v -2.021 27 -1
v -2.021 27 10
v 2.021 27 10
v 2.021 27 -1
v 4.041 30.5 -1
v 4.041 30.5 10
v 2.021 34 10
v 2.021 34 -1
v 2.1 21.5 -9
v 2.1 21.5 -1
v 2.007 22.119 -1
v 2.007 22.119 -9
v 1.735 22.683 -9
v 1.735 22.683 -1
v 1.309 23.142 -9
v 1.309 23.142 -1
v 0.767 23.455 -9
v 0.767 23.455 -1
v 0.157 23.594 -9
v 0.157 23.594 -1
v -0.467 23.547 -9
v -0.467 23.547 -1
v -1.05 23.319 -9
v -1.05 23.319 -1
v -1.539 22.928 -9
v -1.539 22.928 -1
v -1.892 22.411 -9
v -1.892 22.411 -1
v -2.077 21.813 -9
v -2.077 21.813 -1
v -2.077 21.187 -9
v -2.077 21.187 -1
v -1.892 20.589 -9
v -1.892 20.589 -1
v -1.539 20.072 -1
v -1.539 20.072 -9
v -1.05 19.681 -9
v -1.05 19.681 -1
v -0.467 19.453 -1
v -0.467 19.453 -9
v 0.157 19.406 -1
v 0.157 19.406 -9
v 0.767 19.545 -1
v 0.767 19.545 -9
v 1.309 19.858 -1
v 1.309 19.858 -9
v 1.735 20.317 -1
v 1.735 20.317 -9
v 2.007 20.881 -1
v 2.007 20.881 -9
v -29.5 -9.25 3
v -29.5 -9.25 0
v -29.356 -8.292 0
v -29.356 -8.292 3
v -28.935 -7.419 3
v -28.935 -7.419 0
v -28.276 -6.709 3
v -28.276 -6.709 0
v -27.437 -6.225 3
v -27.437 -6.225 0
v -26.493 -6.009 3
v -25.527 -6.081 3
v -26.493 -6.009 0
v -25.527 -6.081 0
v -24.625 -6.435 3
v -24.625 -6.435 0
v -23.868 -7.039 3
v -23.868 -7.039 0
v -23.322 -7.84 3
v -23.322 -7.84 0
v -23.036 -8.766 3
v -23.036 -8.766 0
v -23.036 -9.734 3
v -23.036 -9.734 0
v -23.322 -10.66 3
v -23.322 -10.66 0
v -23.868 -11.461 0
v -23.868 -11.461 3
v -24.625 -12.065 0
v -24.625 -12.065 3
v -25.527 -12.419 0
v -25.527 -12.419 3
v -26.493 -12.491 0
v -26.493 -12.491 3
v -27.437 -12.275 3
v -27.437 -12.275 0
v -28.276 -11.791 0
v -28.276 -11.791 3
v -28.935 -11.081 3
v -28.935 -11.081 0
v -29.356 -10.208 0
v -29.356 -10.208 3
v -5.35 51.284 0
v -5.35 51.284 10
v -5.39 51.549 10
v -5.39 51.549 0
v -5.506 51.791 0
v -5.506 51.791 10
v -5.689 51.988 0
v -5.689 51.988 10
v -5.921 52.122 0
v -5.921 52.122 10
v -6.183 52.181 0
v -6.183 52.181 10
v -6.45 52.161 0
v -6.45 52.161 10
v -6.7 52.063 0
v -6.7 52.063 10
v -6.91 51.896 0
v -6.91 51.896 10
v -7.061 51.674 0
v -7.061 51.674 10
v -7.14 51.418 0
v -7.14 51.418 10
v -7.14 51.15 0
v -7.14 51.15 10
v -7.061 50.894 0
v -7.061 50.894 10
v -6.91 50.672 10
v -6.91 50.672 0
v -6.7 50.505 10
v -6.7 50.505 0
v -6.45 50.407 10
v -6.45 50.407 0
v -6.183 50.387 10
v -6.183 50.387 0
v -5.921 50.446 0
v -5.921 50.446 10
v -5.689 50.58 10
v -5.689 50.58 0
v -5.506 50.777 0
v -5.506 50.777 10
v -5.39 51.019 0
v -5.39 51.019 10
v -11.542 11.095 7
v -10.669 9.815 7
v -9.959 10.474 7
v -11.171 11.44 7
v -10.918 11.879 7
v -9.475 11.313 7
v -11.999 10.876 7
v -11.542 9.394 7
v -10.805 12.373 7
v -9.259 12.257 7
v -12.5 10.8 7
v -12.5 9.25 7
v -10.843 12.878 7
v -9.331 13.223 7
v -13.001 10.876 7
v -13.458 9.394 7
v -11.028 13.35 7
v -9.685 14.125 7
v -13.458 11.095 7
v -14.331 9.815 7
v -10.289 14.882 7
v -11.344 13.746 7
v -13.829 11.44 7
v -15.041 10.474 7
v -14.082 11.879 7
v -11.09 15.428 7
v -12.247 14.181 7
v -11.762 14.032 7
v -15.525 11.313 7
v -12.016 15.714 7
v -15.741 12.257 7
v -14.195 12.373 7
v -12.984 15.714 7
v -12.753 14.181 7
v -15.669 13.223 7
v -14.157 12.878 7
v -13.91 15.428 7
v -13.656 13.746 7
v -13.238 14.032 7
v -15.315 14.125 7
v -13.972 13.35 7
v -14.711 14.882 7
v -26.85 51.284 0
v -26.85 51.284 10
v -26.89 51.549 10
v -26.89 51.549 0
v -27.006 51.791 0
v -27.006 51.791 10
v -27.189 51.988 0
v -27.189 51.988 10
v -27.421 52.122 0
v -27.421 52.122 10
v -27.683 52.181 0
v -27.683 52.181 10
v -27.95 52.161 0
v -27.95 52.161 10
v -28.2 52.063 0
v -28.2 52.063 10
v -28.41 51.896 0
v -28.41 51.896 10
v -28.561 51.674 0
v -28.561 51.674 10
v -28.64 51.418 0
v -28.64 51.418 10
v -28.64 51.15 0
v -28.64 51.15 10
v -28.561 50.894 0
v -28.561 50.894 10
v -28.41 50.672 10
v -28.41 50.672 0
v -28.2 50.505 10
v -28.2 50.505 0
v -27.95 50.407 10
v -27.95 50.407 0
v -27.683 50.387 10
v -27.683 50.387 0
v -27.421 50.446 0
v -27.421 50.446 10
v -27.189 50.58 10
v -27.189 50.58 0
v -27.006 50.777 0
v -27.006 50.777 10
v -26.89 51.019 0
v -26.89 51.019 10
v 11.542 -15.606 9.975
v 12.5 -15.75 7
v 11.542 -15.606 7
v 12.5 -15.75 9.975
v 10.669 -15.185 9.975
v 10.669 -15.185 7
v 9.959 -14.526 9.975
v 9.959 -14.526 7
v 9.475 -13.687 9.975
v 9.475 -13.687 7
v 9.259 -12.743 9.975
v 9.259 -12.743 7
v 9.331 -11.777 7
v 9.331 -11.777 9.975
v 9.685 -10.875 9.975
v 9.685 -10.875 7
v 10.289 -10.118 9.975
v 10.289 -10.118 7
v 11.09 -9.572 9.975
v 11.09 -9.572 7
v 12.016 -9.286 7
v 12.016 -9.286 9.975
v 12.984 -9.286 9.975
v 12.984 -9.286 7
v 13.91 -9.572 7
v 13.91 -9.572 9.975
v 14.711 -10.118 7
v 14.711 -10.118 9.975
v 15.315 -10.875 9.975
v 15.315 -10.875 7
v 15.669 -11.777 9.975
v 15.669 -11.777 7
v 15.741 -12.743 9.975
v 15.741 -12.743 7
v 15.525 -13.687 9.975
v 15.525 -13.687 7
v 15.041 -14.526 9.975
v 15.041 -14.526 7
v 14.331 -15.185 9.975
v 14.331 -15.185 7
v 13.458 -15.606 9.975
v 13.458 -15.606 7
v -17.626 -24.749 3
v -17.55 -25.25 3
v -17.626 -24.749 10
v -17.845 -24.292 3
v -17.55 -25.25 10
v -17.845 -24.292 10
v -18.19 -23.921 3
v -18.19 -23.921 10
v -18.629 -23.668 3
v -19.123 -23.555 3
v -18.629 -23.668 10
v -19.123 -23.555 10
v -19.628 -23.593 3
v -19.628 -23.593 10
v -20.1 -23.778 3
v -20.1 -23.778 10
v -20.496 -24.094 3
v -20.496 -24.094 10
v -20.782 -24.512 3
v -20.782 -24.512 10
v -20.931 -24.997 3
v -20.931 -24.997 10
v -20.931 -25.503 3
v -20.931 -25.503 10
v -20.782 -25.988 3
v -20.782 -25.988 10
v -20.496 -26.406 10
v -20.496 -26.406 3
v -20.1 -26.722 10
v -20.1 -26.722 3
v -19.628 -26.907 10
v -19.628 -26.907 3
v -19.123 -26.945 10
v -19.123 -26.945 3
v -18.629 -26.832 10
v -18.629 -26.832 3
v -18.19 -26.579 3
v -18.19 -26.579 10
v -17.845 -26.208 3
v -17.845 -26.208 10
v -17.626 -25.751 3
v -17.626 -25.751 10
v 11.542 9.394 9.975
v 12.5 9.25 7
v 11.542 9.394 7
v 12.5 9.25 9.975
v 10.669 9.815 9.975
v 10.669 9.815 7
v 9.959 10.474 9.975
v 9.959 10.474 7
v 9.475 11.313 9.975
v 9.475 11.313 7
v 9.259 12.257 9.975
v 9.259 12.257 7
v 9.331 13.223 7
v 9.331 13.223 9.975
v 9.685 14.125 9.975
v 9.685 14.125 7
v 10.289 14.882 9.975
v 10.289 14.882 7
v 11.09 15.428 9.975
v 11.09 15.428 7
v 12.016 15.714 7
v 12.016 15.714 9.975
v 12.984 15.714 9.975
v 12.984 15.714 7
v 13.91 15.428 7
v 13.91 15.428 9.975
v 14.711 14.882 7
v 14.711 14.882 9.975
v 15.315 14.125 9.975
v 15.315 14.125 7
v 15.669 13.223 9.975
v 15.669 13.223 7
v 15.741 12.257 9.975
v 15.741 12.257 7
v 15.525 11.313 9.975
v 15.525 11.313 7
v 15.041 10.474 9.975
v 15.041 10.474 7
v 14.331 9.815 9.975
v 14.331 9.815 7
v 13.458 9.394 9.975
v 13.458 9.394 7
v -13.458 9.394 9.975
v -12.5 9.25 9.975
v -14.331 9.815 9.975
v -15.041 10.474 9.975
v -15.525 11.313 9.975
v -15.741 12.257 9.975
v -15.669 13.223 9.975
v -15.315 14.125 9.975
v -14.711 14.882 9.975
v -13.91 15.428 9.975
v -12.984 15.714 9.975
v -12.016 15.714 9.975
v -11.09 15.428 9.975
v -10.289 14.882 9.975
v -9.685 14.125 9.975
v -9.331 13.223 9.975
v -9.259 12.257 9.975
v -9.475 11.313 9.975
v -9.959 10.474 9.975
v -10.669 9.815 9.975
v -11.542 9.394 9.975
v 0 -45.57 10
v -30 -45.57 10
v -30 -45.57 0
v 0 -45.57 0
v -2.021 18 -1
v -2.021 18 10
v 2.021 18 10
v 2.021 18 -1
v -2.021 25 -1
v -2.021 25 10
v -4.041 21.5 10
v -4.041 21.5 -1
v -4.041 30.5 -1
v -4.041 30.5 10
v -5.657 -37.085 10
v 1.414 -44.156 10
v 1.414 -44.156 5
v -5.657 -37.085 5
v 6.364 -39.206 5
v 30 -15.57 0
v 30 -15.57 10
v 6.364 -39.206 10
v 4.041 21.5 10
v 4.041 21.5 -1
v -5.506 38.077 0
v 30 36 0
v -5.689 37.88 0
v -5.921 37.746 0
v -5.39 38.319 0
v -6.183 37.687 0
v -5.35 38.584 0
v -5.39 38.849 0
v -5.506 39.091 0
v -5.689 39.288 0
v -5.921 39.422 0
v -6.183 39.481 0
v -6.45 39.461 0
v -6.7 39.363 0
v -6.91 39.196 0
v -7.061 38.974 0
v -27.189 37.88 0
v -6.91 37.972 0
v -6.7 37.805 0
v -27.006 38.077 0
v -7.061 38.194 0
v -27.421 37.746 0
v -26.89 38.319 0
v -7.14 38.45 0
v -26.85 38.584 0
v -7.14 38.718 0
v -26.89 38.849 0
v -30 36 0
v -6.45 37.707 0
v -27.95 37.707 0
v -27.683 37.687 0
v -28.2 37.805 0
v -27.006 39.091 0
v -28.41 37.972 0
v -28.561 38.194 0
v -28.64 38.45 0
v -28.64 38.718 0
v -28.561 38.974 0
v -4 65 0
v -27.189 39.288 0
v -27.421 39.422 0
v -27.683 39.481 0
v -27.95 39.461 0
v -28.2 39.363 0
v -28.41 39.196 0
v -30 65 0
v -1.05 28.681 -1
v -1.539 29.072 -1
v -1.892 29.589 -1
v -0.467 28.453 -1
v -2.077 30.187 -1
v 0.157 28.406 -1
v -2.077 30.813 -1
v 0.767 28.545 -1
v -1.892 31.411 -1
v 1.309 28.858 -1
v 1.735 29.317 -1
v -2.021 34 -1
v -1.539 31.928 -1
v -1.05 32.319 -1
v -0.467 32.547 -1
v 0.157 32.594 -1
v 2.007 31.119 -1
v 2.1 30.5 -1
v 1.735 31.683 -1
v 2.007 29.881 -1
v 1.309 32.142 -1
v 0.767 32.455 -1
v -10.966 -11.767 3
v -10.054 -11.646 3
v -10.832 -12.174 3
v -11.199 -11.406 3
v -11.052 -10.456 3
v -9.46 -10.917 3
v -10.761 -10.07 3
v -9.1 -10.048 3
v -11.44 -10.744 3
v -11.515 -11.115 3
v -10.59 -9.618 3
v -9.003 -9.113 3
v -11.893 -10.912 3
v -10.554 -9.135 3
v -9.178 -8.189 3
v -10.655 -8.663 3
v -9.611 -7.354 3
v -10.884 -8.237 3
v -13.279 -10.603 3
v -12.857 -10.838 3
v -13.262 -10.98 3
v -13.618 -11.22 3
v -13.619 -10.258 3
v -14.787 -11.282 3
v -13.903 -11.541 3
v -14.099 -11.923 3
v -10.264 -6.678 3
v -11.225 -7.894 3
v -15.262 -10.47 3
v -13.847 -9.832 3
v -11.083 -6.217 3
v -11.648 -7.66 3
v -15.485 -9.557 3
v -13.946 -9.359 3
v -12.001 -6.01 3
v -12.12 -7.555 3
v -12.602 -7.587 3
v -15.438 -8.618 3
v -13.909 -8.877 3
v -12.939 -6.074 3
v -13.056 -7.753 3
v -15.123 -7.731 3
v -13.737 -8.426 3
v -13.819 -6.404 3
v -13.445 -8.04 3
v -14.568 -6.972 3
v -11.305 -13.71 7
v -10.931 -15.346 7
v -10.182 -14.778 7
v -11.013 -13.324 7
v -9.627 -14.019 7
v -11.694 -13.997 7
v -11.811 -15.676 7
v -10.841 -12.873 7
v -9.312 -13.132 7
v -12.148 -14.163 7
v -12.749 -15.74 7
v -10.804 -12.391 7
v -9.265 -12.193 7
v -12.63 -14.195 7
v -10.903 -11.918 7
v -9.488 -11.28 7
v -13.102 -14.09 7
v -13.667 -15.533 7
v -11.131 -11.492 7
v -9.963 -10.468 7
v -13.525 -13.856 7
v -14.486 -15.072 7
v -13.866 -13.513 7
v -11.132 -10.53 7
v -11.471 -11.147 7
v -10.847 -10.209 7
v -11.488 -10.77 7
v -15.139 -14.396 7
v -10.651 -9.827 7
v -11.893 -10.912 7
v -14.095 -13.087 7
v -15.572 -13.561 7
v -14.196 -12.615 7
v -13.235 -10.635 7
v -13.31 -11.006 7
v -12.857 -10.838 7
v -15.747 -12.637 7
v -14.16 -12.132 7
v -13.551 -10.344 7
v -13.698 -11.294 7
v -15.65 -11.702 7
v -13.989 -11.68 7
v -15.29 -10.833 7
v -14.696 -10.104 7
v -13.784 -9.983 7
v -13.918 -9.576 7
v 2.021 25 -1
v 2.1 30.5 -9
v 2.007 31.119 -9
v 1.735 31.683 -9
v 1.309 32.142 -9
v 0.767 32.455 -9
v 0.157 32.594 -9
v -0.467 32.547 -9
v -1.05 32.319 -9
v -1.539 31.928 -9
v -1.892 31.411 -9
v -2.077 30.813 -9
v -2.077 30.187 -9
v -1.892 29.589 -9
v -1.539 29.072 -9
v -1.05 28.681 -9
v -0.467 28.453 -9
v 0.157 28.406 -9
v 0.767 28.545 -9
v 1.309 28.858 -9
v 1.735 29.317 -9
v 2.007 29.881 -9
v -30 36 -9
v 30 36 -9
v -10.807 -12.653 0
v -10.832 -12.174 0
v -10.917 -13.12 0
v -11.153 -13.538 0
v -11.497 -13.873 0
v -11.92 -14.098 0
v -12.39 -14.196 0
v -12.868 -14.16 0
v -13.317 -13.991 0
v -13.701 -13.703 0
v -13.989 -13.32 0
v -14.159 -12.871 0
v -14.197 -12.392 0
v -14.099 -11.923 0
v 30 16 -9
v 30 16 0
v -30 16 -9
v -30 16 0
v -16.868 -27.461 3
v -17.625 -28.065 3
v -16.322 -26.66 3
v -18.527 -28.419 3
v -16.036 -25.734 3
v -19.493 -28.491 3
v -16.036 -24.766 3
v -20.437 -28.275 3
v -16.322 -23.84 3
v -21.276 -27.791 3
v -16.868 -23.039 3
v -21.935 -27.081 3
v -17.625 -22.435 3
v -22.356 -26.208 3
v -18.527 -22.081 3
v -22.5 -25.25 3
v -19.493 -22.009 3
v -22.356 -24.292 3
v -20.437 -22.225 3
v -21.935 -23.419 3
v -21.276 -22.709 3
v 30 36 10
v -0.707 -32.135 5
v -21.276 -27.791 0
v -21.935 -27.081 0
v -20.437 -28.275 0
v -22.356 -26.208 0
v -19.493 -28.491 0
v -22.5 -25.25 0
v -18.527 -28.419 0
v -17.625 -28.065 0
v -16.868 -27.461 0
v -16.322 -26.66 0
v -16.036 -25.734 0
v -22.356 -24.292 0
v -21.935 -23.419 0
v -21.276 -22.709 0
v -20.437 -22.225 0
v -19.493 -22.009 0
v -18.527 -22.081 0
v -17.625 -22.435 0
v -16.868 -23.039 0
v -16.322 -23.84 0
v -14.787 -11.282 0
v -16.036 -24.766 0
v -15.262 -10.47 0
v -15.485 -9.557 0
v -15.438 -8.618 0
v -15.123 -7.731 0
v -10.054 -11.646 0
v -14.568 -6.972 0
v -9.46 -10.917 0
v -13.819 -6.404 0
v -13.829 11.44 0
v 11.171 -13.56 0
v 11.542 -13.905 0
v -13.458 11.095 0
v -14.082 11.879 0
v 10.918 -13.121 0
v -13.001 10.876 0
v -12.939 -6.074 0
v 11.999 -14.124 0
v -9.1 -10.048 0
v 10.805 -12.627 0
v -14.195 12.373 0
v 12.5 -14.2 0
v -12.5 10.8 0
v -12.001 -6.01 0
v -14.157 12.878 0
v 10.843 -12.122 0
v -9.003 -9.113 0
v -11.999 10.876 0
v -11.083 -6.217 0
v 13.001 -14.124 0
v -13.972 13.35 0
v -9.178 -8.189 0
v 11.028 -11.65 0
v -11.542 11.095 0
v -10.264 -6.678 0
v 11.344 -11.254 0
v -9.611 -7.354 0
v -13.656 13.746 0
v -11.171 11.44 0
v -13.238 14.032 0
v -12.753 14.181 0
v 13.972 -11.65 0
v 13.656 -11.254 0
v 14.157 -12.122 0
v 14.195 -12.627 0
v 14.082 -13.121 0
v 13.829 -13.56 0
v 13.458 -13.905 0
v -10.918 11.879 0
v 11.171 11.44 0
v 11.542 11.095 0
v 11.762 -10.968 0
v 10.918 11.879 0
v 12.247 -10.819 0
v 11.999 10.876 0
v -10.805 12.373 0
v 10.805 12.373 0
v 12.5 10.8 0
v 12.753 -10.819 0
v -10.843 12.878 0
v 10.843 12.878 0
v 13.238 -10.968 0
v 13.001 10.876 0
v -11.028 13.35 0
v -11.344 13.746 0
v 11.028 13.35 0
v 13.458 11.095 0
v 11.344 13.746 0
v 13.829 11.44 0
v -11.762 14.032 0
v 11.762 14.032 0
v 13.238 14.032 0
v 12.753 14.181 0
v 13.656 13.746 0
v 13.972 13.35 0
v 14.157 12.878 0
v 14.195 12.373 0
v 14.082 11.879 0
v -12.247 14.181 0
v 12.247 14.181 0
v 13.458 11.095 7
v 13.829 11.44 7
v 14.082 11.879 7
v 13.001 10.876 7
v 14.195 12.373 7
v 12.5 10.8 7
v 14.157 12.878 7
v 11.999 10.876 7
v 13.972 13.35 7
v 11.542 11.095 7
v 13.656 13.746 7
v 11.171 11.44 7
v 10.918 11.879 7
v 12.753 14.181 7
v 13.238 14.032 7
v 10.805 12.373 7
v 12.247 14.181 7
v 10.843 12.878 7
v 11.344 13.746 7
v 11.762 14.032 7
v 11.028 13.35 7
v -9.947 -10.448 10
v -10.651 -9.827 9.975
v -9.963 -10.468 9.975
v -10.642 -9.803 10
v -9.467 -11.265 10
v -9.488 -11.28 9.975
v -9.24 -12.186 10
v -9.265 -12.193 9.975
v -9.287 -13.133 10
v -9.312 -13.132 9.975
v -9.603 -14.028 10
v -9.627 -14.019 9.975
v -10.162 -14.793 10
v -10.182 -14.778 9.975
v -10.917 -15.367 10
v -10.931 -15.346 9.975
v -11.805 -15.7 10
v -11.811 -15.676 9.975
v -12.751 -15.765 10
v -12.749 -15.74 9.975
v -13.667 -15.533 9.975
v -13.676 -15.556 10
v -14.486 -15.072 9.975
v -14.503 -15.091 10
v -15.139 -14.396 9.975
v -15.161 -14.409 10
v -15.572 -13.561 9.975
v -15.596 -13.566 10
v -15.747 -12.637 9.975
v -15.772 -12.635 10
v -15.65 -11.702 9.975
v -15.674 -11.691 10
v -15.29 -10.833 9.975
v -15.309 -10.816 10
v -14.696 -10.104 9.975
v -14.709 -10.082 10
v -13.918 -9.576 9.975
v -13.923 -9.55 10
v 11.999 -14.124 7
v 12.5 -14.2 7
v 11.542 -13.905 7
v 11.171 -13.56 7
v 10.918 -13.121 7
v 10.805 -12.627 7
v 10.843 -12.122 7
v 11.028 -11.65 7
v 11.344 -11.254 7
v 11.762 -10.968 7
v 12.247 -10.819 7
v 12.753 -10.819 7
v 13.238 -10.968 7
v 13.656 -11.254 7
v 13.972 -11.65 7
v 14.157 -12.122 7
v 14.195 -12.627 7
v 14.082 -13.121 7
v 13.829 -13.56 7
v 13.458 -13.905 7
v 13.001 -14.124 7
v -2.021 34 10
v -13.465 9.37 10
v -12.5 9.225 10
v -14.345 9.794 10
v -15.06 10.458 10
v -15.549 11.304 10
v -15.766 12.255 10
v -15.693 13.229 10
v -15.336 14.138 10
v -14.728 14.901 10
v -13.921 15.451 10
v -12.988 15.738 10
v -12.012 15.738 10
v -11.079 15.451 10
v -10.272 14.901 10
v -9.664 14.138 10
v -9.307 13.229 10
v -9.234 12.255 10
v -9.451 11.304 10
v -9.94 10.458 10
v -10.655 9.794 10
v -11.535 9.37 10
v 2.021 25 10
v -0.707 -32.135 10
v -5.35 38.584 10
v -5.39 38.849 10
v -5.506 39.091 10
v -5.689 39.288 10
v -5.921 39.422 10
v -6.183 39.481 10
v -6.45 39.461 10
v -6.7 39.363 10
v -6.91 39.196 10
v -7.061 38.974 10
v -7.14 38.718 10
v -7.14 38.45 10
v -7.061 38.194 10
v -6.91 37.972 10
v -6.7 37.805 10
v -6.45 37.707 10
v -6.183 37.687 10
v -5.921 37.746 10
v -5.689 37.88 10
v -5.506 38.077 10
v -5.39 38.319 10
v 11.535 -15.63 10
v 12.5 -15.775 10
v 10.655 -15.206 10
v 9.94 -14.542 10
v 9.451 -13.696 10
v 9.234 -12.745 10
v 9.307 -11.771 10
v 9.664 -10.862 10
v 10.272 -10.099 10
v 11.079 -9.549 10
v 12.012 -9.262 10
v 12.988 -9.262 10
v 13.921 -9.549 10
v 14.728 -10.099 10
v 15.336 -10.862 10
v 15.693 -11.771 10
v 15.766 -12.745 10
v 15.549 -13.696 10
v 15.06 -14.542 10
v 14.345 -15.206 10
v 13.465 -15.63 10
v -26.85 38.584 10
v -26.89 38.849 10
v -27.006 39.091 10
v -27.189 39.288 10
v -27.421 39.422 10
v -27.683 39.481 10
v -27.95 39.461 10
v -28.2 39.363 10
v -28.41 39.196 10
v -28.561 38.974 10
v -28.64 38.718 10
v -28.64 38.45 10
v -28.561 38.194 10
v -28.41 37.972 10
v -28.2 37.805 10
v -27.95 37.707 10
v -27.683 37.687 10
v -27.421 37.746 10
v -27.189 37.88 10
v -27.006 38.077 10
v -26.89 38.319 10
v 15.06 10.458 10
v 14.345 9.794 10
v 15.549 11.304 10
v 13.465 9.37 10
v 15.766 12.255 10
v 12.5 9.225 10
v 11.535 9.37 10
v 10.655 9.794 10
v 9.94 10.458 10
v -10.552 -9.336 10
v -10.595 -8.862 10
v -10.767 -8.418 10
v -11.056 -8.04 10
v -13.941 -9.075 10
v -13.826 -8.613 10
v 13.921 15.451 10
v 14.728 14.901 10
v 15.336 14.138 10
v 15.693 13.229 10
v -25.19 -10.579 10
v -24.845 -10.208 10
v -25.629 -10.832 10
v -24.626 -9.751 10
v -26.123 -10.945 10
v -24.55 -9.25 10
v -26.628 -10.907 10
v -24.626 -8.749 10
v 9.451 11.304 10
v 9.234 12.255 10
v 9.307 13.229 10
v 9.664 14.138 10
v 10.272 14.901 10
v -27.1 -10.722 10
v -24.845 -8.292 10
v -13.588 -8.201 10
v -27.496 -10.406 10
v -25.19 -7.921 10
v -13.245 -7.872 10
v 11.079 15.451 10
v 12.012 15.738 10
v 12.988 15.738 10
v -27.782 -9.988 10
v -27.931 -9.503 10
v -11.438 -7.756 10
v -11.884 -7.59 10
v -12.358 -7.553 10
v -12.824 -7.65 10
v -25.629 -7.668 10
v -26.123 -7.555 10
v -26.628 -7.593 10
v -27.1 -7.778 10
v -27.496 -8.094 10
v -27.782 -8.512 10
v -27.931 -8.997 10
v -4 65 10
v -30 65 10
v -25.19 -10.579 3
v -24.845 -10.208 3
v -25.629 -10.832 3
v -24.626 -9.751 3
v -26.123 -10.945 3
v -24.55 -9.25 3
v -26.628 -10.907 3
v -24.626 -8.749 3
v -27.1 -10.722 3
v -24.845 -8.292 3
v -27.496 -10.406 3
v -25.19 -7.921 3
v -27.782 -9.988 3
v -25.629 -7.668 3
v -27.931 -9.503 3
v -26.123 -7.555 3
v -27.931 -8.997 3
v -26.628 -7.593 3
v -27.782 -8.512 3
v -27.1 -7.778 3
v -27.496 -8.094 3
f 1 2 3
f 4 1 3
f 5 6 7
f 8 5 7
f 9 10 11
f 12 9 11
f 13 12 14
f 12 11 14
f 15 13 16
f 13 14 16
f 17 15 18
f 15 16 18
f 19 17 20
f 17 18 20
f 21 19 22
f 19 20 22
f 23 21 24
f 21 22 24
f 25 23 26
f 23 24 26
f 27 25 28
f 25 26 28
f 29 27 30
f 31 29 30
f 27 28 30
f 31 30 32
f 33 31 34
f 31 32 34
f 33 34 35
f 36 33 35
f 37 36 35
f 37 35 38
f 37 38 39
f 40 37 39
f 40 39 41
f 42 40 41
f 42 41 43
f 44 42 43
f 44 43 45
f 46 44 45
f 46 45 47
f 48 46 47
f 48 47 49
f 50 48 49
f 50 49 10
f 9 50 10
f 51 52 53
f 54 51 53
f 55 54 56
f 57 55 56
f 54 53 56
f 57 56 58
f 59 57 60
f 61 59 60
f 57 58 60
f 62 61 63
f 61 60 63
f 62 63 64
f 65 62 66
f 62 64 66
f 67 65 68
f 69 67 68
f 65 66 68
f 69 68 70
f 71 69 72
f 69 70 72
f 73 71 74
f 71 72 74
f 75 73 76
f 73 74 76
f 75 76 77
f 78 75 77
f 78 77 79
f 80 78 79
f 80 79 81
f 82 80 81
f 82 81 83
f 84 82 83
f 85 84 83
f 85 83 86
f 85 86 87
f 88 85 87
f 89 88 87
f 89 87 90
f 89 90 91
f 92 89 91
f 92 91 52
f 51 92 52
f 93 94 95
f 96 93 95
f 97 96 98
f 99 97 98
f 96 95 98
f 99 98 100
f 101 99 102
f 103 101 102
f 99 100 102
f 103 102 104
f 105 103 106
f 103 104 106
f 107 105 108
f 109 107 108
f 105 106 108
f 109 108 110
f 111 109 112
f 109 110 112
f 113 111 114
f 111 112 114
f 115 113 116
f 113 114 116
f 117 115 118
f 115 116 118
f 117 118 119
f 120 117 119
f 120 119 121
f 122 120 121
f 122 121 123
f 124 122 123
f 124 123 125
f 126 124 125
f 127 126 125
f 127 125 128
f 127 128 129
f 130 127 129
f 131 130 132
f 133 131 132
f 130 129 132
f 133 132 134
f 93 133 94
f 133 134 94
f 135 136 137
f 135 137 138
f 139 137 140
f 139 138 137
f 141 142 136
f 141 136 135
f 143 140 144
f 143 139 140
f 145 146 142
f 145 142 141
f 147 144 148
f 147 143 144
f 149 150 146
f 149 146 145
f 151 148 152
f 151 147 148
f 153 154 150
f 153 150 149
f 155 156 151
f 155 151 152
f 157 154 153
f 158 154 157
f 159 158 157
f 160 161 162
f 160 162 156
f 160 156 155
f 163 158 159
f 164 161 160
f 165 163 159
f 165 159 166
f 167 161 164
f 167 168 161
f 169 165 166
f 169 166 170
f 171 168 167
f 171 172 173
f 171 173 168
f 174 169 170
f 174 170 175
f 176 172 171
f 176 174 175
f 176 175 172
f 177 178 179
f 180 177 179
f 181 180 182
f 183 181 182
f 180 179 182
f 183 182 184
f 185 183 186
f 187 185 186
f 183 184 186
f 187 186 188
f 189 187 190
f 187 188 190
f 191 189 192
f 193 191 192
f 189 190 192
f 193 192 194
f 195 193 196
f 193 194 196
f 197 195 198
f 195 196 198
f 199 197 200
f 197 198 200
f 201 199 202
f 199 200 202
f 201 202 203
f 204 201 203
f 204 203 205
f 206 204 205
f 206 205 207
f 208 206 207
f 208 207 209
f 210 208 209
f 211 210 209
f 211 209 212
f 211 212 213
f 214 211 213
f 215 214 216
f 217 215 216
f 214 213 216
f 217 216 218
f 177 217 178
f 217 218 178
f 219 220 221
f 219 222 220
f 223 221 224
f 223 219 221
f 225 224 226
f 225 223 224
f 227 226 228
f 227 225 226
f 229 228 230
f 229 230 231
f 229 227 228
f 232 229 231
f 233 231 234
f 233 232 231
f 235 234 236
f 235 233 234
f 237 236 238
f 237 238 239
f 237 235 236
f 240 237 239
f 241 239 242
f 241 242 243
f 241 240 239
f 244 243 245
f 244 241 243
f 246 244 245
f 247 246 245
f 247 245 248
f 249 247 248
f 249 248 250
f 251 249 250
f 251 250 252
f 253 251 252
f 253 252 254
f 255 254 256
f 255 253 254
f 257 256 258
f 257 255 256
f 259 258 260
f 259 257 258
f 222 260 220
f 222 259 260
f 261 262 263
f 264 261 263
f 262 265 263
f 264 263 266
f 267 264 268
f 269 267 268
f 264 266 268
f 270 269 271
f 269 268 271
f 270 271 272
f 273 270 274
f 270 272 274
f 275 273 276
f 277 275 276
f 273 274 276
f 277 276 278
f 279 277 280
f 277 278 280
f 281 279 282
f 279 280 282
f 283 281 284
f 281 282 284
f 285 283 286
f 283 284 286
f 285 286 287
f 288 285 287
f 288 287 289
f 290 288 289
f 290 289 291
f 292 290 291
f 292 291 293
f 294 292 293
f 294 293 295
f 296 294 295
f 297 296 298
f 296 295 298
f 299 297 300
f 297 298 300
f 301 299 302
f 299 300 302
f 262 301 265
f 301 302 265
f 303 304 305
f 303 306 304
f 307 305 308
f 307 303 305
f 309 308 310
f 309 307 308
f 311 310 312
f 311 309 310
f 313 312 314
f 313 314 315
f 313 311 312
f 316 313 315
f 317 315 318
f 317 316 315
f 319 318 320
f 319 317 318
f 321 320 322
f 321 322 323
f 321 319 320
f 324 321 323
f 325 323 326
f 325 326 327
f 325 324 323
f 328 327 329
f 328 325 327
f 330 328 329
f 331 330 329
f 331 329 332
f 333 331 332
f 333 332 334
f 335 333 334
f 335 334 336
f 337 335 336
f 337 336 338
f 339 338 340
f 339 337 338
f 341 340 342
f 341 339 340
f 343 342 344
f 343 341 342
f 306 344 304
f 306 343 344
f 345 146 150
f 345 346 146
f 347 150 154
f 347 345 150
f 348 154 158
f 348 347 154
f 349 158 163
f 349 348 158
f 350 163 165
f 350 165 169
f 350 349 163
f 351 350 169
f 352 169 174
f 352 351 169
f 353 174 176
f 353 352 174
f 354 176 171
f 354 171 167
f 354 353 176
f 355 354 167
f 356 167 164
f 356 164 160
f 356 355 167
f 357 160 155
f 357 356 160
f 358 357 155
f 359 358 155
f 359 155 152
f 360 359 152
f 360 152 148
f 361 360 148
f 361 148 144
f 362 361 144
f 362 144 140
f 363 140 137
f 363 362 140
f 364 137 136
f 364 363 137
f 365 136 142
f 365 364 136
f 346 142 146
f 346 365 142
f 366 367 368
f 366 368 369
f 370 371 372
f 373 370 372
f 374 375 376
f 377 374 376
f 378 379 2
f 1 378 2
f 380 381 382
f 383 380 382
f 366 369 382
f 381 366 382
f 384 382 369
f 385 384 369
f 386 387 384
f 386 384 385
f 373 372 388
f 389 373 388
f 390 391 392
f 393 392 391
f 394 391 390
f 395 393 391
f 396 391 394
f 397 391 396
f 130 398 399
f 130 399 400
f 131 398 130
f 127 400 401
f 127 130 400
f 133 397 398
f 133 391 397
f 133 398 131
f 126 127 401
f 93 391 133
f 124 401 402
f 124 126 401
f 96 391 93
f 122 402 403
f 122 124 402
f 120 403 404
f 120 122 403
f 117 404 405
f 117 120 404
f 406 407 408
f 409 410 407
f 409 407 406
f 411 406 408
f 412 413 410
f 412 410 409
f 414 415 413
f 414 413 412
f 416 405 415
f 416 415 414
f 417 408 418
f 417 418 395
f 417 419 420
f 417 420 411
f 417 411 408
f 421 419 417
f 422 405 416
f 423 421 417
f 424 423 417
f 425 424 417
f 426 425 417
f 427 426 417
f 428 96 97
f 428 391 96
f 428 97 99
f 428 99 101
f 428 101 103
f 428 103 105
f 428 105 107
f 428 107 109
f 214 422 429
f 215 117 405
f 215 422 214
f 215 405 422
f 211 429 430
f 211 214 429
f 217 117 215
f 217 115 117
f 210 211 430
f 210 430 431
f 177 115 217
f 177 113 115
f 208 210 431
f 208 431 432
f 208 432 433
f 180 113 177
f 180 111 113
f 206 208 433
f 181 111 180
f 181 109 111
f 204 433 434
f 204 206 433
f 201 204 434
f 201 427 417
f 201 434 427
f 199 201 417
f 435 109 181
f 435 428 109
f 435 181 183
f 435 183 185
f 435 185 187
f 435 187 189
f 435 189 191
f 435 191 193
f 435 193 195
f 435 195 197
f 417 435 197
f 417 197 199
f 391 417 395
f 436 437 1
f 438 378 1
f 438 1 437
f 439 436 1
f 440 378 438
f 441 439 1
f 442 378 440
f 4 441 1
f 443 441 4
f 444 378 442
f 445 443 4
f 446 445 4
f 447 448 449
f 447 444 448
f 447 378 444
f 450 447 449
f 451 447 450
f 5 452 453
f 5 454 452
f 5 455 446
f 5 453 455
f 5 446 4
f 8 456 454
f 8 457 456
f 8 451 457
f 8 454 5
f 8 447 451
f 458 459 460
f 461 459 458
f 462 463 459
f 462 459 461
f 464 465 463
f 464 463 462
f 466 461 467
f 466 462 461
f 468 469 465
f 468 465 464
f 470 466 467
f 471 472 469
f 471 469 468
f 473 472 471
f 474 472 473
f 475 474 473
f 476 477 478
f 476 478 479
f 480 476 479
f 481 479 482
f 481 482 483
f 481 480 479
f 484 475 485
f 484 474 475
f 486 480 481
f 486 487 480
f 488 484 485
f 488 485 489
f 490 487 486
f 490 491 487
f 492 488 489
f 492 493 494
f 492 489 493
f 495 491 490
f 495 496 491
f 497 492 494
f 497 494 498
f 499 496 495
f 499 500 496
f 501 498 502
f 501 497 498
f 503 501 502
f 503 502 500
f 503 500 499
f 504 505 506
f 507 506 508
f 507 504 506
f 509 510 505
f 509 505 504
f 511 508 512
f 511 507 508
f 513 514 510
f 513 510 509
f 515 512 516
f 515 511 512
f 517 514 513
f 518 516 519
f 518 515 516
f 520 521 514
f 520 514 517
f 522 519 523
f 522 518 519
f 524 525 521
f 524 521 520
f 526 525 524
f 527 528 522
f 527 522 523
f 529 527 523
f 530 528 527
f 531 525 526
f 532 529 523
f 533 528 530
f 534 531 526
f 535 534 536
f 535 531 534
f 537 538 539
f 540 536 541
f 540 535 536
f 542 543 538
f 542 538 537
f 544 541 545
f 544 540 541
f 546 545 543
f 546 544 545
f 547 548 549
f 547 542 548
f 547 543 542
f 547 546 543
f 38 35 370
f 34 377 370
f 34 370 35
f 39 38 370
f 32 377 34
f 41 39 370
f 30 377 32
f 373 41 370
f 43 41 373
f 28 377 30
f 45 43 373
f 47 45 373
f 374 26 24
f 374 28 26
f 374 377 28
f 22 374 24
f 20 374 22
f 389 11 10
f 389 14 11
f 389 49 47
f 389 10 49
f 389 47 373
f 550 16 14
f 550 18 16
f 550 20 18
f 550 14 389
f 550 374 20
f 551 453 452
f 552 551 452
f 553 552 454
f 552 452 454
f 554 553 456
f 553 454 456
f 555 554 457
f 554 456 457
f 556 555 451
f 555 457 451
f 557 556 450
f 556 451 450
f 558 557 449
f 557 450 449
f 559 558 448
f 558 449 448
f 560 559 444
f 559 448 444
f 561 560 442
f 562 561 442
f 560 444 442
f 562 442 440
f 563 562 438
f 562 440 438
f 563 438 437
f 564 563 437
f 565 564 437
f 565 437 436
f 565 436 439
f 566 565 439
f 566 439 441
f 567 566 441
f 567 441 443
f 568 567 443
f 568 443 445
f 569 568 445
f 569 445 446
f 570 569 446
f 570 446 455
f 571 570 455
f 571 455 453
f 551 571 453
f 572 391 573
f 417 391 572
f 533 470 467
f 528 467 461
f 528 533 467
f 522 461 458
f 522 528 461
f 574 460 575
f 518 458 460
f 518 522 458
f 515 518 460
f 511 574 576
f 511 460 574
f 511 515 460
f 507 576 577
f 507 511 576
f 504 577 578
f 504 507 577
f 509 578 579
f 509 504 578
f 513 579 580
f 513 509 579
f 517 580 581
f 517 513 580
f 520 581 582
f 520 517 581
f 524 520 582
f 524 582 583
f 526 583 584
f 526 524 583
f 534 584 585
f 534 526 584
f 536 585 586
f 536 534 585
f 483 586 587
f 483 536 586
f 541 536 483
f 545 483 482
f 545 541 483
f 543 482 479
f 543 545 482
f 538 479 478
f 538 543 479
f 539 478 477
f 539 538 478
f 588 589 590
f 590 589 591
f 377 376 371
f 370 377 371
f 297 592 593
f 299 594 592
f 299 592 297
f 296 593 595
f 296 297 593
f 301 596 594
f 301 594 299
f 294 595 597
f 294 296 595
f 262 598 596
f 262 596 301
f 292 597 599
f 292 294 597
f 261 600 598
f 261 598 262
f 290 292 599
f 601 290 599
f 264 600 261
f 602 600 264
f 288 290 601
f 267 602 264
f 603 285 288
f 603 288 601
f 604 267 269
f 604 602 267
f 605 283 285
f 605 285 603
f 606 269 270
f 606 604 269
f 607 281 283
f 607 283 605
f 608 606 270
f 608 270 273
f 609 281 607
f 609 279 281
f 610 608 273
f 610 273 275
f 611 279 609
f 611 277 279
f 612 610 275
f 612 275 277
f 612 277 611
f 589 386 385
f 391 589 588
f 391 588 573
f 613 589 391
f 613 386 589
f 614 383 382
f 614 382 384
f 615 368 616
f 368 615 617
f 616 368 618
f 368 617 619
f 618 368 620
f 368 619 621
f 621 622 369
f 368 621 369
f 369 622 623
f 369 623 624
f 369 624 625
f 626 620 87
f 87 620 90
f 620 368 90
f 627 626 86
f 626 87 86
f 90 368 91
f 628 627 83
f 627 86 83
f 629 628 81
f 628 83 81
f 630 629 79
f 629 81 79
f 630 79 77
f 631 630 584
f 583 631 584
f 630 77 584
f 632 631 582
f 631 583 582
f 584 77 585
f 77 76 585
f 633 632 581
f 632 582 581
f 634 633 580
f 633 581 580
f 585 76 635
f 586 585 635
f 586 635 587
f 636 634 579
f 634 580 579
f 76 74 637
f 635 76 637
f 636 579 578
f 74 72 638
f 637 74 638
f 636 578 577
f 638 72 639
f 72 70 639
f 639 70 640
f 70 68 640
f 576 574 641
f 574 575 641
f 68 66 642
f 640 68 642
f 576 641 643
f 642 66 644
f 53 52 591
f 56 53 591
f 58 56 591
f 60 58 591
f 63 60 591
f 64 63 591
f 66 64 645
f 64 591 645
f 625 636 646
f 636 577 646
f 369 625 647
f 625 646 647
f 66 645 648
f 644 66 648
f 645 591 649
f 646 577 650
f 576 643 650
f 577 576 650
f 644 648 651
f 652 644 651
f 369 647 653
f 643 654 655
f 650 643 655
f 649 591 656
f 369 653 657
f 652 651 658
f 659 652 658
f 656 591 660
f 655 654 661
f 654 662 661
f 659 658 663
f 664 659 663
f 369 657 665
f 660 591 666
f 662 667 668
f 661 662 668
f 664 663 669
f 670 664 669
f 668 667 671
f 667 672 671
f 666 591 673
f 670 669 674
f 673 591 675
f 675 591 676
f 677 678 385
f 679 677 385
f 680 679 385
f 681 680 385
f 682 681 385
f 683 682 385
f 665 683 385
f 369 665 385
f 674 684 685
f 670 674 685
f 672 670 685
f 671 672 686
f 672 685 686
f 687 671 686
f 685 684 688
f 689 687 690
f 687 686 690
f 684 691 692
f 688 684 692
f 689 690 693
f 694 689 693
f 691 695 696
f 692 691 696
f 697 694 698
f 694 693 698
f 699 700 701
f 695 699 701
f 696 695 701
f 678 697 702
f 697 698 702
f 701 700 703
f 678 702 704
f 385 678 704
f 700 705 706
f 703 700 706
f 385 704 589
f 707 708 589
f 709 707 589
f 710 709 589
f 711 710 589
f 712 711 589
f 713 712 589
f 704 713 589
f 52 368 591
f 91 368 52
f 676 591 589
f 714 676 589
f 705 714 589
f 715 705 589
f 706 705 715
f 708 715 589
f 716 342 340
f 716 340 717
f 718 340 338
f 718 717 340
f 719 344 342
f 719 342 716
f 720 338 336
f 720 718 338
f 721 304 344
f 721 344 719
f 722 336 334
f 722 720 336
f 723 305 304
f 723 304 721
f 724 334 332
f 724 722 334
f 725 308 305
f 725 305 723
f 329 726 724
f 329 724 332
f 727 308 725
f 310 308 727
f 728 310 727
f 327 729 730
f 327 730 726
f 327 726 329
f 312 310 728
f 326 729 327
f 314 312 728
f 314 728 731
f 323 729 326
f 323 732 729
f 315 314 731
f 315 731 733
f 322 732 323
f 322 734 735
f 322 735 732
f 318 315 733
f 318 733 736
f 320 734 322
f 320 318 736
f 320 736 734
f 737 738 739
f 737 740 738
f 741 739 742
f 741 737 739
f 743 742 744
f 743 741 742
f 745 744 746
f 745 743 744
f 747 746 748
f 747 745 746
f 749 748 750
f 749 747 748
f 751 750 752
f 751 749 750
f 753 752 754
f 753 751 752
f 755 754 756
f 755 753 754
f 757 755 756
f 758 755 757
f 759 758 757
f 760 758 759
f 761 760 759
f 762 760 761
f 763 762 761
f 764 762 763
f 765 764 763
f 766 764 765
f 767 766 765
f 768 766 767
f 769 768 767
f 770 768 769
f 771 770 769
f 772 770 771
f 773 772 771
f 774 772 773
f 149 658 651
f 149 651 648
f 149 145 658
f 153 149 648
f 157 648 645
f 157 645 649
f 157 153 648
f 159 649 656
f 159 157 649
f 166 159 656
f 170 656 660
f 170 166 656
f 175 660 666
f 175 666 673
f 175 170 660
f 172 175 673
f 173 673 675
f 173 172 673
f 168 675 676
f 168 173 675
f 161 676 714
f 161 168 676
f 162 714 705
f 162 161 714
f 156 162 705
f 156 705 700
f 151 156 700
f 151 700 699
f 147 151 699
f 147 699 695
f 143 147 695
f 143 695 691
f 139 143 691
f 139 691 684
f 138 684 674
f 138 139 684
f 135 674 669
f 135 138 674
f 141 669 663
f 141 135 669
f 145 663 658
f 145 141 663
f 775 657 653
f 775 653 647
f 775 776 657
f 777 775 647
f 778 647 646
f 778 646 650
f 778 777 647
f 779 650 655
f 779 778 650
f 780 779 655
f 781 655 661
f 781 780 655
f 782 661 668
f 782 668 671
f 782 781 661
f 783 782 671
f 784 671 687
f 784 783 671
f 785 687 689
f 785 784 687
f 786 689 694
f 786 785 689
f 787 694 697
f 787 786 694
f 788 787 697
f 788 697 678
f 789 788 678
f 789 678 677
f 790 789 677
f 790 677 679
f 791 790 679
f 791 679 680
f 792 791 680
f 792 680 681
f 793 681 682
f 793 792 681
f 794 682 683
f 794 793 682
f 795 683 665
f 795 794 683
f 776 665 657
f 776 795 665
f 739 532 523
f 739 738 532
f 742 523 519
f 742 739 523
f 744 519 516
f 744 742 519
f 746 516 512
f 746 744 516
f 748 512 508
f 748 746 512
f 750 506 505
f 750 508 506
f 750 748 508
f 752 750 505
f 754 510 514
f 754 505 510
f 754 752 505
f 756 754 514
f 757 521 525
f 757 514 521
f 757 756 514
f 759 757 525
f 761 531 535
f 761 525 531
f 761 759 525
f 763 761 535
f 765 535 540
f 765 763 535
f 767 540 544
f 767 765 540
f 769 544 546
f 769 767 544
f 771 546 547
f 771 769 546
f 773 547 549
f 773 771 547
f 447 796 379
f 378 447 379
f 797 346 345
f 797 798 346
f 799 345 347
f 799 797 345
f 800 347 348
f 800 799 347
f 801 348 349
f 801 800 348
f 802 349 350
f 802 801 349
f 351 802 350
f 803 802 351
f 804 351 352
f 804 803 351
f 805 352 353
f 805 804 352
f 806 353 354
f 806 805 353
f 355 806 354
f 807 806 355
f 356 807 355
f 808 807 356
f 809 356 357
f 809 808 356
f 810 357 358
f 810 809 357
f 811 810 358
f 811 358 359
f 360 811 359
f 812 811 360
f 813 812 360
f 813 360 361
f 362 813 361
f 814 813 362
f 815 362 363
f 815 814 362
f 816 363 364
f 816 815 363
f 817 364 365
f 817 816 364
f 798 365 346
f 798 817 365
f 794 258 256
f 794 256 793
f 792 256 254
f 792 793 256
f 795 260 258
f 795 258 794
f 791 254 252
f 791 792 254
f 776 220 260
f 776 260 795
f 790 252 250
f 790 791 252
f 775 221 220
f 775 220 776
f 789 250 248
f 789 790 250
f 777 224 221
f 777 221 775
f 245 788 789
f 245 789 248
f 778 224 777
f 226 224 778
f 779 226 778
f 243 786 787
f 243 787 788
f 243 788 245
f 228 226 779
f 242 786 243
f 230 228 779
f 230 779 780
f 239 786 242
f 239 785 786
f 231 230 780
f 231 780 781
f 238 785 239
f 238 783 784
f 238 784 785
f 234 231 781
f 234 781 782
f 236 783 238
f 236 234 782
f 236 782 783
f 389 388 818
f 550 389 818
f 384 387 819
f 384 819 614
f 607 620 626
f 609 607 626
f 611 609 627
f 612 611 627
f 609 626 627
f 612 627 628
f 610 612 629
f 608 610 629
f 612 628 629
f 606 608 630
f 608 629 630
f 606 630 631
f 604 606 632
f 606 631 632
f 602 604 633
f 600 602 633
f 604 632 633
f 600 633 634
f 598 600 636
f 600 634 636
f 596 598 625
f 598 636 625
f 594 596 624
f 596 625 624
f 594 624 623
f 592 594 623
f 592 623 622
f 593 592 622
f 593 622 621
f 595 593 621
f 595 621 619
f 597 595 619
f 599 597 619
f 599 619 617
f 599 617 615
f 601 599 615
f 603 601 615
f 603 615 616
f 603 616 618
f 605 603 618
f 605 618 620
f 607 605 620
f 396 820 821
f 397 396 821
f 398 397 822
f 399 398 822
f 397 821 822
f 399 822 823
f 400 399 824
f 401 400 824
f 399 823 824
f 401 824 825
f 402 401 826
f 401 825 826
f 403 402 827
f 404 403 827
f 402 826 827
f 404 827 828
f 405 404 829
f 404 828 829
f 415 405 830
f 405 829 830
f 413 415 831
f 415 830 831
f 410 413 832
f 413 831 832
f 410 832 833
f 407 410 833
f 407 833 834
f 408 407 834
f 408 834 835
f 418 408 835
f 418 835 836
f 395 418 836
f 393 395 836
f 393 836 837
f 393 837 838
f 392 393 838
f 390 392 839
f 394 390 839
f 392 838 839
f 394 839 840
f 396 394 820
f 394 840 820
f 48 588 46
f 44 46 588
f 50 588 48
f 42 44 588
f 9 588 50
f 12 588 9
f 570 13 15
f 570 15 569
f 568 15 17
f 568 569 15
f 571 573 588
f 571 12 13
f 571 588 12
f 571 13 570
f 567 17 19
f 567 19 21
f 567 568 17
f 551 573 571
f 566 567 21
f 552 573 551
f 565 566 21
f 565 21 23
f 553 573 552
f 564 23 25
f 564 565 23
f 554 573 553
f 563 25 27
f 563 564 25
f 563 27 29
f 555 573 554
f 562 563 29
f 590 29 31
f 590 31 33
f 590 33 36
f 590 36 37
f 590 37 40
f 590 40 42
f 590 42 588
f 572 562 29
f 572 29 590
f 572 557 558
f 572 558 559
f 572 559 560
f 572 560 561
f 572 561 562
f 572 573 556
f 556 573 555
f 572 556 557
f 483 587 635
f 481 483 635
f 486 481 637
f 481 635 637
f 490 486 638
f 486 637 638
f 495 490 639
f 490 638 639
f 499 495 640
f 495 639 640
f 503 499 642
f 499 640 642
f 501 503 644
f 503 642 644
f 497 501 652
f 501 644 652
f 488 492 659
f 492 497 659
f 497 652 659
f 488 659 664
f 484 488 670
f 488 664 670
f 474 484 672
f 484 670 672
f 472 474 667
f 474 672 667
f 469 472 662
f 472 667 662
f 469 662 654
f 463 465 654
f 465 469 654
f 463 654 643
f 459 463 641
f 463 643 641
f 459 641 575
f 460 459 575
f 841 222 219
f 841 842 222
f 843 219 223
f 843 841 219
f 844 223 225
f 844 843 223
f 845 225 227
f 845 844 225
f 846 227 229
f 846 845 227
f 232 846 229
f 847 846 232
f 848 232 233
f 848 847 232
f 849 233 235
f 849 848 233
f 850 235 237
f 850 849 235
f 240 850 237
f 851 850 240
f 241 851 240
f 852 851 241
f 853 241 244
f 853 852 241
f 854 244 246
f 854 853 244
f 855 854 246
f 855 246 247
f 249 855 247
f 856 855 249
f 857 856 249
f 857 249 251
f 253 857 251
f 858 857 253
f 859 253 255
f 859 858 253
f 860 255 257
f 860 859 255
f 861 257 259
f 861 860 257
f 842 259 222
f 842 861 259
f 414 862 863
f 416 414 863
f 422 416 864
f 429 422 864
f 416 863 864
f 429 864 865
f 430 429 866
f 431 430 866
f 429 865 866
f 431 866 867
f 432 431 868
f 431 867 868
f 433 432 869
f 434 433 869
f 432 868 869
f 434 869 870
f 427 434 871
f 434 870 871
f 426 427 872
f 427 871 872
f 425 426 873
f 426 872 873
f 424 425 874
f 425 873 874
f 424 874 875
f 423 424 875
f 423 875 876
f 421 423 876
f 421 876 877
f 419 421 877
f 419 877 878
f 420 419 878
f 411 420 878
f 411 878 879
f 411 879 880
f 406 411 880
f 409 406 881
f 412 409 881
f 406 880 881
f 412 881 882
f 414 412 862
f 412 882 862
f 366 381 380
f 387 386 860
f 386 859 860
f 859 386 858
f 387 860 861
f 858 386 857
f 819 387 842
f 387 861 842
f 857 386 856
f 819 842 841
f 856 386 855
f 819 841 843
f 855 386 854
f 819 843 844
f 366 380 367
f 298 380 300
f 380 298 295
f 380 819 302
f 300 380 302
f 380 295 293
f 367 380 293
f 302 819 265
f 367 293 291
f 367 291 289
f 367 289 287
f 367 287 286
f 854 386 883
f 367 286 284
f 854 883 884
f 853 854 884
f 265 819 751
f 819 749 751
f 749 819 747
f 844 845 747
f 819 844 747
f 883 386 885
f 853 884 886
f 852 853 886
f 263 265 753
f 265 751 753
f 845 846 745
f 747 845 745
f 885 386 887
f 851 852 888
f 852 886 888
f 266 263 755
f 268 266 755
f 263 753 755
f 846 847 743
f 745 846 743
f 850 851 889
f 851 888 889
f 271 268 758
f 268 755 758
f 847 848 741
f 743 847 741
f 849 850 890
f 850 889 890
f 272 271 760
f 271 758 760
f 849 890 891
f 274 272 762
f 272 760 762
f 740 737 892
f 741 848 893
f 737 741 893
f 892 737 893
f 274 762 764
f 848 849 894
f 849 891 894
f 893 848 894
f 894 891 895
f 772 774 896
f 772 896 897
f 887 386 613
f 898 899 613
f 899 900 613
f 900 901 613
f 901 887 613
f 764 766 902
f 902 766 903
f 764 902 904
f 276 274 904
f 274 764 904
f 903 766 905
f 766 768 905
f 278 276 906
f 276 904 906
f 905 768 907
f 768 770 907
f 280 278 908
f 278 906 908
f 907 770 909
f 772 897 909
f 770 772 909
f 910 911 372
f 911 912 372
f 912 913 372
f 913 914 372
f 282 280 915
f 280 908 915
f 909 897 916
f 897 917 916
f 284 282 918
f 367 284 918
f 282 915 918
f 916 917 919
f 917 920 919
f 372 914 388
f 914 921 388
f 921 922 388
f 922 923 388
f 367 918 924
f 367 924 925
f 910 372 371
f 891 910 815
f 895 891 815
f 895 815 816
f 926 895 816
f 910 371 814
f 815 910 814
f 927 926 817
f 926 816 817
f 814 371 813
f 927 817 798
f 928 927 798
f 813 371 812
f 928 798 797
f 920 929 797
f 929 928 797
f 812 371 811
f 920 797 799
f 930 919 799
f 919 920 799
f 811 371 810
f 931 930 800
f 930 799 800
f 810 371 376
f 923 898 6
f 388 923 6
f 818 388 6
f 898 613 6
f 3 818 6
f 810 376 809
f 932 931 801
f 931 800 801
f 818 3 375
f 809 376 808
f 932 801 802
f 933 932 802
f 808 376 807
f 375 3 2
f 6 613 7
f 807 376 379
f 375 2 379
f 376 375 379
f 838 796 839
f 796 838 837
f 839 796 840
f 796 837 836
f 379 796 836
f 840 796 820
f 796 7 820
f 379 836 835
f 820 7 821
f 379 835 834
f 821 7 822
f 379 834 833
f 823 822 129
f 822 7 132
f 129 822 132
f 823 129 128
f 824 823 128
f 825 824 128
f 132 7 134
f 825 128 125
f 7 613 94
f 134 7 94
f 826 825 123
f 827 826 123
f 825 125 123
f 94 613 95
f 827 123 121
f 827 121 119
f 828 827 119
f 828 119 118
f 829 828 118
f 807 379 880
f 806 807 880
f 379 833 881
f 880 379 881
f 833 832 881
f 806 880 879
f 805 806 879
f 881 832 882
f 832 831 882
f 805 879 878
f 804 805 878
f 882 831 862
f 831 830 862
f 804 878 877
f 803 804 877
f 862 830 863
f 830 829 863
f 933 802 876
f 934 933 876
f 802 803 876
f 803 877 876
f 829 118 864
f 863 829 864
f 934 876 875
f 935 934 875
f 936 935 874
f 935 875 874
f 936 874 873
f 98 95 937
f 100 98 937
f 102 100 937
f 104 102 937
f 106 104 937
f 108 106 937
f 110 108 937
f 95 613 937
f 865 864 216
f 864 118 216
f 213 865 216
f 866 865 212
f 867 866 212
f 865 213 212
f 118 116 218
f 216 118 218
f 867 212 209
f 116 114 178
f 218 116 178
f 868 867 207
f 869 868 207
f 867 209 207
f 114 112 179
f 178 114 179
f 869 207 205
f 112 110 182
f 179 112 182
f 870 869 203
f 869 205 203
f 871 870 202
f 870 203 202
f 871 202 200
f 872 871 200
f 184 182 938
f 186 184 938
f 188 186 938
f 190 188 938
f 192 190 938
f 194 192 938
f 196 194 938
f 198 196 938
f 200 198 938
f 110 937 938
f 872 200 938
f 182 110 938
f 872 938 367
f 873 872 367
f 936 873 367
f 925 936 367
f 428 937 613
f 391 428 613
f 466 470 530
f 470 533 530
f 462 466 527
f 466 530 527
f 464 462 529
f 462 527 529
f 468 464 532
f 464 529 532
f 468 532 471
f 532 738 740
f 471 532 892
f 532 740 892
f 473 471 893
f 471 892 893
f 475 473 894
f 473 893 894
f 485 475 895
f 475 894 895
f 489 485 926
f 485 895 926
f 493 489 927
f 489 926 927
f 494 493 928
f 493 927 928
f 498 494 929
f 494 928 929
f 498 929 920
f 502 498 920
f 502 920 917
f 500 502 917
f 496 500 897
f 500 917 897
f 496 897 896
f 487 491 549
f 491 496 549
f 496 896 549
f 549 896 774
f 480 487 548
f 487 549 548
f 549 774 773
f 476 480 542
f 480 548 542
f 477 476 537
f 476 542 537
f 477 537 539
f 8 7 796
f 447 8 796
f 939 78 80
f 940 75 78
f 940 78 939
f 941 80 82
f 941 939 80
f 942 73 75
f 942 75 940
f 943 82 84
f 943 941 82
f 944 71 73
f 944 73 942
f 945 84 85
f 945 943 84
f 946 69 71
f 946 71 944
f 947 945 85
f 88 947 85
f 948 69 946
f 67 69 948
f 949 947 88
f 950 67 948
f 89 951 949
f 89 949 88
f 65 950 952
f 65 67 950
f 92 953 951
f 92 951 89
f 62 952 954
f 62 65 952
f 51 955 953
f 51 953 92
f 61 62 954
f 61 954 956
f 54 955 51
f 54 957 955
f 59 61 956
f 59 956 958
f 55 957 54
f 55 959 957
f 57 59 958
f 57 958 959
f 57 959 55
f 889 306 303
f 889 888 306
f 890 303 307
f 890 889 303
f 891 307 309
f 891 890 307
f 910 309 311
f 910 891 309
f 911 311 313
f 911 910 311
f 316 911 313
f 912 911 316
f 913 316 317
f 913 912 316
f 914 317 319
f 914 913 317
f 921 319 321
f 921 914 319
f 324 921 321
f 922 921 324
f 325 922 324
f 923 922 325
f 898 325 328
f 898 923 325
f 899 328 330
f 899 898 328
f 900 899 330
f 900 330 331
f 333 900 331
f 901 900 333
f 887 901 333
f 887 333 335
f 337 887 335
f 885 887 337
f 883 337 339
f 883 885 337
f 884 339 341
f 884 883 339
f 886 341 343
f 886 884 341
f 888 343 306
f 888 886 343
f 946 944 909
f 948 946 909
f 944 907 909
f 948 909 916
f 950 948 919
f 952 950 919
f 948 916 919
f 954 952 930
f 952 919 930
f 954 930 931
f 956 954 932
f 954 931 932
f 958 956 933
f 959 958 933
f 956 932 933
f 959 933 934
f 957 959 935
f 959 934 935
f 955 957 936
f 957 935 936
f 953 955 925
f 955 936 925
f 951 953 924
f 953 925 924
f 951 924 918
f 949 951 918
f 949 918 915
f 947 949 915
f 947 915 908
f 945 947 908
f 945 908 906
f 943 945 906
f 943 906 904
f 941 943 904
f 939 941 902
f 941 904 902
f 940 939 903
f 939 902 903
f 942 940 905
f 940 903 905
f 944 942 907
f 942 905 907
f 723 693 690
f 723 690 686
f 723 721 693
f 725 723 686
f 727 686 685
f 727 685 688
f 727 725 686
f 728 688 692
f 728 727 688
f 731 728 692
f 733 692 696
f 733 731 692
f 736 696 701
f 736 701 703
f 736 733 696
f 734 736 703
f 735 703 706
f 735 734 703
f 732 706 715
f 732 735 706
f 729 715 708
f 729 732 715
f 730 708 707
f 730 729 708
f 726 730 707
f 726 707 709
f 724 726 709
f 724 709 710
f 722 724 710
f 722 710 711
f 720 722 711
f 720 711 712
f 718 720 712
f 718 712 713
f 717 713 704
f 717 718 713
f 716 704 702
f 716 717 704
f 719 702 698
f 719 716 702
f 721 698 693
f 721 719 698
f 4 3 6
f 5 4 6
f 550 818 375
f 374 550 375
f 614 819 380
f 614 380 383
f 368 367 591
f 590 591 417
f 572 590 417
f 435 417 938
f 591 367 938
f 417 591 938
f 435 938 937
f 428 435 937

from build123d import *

# Parameters (mm, degrees)
SKETCH2_W                      = 60
SKETCH2_H                      = 72
BOSS_EXTRUDE1_DEPTH            = 10
SKETCH9_W                      = 60
SKETCH9_H                      = 20
BOSS_EXTRUDE2_DEPTH            = 9
CBORE_FOR_M3_SHCS1_AT_2_COUNT  = 2
CBORE_FOR_M3_SHCS1_AT_2_PITCH  = 25
CBORE_FOR_M3_SHCS1_AT_3_COUNT  = 2
CBORE_FOR_M3_SHCS1_AT_3_PITCH  = 35.355339059
CBORE_FOR_M3_SHCS1_AT_4_COUNT  = 2
CBORE_FOR_M3_SHCS1_AT_4_PITCH  = 25
CUT_EXTRUDE1_DEPTH             = 11
SKETCH8_R                      = 2.1
CUT_EXTRUDE2_DEPTH             = 49.135226186
SKETCH14_W                     = 60
SKETCH14_H                     = 9.57
BOSS_EXTRUDE3_DEPTH            = 10
CBORE_FOR_M3_SHCS2_D           = 3.4
CBORE_FOR_M3_SHCS2_CBORE_D     = 6.5
CBORE_FOR_M3_SHCS2_CBORE_DEPTH = 3
CUT_EXTRUDE3_DEPTH             = 58.772181022
BOSS_EXTRUDE4_DEPTH            = 10
SKETCH20_R                     = 0.9
CUT_EXTRUDE4_DEPTH             = 10
SKETCH21_W                     = 5
SKETCH21_H                     = 7
CUT_EXTRUDE5_DEPTH             = 10


with BuildPart() as part:
    # Sketch2 → Boss-Extrude1 (new body)
    with BuildSketch(Plane.XY):
        Rectangle(SKETCH2_W, SKETCH2_H)
    extrude(amount=BOSS_EXTRUDE1_DEPTH)

    # Sketch9 → Boss-Extrude2 (add)
    with BuildSketch(Plane(origin=(0, 0, 0), x_dir=(-1, 0, 0), z_dir=(0, 0, -1))):
        with Locations((0, 26)):
            Rectangle(SKETCH9_W, SKETCH9_H)
    extrude(amount=BOSS_EXTRUDE2_DEPTH)

    # Sketch6 → CBORE for M3 SHCS1 (revolve, cut)
    with BuildSketch(Plane(origin=(-12.5, 12.5, 10), x_dir=(0, -1, 0), z_dir=(1, 0, 0))):
        Polygon((0, 0), (0, 11.021463052), (1.7, 10), (1.7, 3), (3.25, 3), (3.25, 0.025), (3.275, 0), align=None)
    cbore_for_m3_shcs1 = revolve(axis=Axis((-12.5, 12.5, 16.35), (0, 0, -1)), mode=Mode.SUBTRACT)

    # CBORE for M3 SHCS1 at 2: CBORE for M3 SHCS1 ×2
    with Locations(*[(i * CBORE_FOR_M3_SHCS1_AT_2_PITCH, 0, 0) for i in range(1, CBORE_FOR_M3_SHCS1_AT_2_COUNT)]):
        add(cbore_for_m3_shcs1, mode=Mode.SUBTRACT)

    # CBORE for M3 SHCS1 at 3: CBORE for M3 SHCS1 ×2
    with Locations(*[Vector(0.7071067811865477, -0.7071067811865475, 0) * (i * CBORE_FOR_M3_SHCS1_AT_3_PITCH) for i in range(1, CBORE_FOR_M3_SHCS1_AT_3_COUNT)]):
        add(cbore_for_m3_shcs1, mode=Mode.SUBTRACT)

    # CBORE for M3 SHCS1 at 4: CBORE for M3 SHCS1 ×2
    with Locations(*[(0, -i * CBORE_FOR_M3_SHCS1_AT_4_PITCH, 0) for i in range(1, CBORE_FOR_M3_SHCS1_AT_4_COUNT)]):
        add(cbore_for_m3_shcs1, mode=Mode.SUBTRACT)

    # Sketch7 → Cut-Extrude1 (cut)
    with BuildSketch(Plane.XY.offset(10)):
        Polygon((4.041451884, 21.5), (2.020725942, 25), (-2.020725942, 25), (-4.041451884, 21.5), (-2.020725942, 18), (2.020725942, 18), align=None)
        Polygon((4.041451884, 30.5), (2.020725942, 34), (-2.020725942, 34), (-4.041451884, 30.5), (-2.020725942, 27), (2.020725942, 27), align=None)
    extrude(amount=-CUT_EXTRUDE1_DEPTH, mode=Mode.SUBTRACT)

    # Sketch8 → Cut-Extrude2 (cut, through all)
    with BuildSketch(Plane.XY.offset(-1)):
        with Locations((0, 30.5)):
            Circle(SKETCH8_R)
        with Locations((0, 21.5)):
            Circle(SKETCH8_R)
    extrude(amount=-CUT_EXTRUDE2_DEPTH, mode=Mode.SUBTRACT)

    # Sketch14 → Boss-Extrude3 (add)
    with BuildSketch(Plane.XY.offset(10)):
        with Locations((0, -40.785)):
            Rectangle(SKETCH14_W, SKETCH14_H)
    extrude(amount=-BOSS_EXTRUDE3_DEPTH)

    # CBORE for M3 SHCS2 (through all)
    with Locations(Plane(origin=(0, 0, 0), x_dir=(-1, 0, 0), z_dir=(0, 0, -1))):
        with Locations((19.25, -25.25), (12.25, -9.25), (26.25, -9.25)):
            CounterBoreHole(CBORE_FOR_M3_SHCS2_D / 2, CBORE_FOR_M3_SHCS2_CBORE_D / 2, CBORE_FOR_M3_SHCS2_CBORE_DEPTH)

    # Sketch18 → Cut-Extrude3 (cut, through all)
    with BuildSketch(Plane.XY.offset(10)):
        Polygon((0, -45.57), (30, -15.57), (30, -45.57), align=None)
    extrude(amount=-CUT_EXTRUDE3_DEPTH, mode=Mode.SUBTRACT)

    # Sketch19 → Boss-Extrude4 (add)
    with BuildSketch(Plane.XY.offset(10)):
        Polygon((-30, 36), (-30, 65), (-4, 65), (30, 36), align=None)
    extrude(amount=-BOSS_EXTRUDE4_DEPTH)

    # Sketch20 → Cut-Extrude4 (cut)
    with BuildSketch(Plane.XY.offset(10)):
        with Locations((-27.75, 51.284)):
            Circle(SKETCH20_R)
        with Locations((-27.75, 38.584)):
            Circle(SKETCH20_R)
        with Locations((-6.25, 38.584)):
            Circle(SKETCH20_R)
        with Locations((-6.25, 51.284)):
            Circle(SKETCH20_R)
    extrude(amount=-CUT_EXTRUDE4_DEPTH, mode=Mode.SUBTRACT)

    # Sketch21 → Cut-Extrude5 (cut)
    with BuildSketch(Plane(origin=(22.785, -22.785, 0), x_dir=(0, 0, -1), z_dir=(0.707106781186544, -0.7071067811865511, 0))):
        with Locations((-7.5, -26.722856019)):
            Rectangle(SKETCH21_W, SKETCH21_H)
    extrude(amount=-CUT_EXTRUDE5_DEPTH, mode=Mode.SUBTRACT)


solid = part.part
